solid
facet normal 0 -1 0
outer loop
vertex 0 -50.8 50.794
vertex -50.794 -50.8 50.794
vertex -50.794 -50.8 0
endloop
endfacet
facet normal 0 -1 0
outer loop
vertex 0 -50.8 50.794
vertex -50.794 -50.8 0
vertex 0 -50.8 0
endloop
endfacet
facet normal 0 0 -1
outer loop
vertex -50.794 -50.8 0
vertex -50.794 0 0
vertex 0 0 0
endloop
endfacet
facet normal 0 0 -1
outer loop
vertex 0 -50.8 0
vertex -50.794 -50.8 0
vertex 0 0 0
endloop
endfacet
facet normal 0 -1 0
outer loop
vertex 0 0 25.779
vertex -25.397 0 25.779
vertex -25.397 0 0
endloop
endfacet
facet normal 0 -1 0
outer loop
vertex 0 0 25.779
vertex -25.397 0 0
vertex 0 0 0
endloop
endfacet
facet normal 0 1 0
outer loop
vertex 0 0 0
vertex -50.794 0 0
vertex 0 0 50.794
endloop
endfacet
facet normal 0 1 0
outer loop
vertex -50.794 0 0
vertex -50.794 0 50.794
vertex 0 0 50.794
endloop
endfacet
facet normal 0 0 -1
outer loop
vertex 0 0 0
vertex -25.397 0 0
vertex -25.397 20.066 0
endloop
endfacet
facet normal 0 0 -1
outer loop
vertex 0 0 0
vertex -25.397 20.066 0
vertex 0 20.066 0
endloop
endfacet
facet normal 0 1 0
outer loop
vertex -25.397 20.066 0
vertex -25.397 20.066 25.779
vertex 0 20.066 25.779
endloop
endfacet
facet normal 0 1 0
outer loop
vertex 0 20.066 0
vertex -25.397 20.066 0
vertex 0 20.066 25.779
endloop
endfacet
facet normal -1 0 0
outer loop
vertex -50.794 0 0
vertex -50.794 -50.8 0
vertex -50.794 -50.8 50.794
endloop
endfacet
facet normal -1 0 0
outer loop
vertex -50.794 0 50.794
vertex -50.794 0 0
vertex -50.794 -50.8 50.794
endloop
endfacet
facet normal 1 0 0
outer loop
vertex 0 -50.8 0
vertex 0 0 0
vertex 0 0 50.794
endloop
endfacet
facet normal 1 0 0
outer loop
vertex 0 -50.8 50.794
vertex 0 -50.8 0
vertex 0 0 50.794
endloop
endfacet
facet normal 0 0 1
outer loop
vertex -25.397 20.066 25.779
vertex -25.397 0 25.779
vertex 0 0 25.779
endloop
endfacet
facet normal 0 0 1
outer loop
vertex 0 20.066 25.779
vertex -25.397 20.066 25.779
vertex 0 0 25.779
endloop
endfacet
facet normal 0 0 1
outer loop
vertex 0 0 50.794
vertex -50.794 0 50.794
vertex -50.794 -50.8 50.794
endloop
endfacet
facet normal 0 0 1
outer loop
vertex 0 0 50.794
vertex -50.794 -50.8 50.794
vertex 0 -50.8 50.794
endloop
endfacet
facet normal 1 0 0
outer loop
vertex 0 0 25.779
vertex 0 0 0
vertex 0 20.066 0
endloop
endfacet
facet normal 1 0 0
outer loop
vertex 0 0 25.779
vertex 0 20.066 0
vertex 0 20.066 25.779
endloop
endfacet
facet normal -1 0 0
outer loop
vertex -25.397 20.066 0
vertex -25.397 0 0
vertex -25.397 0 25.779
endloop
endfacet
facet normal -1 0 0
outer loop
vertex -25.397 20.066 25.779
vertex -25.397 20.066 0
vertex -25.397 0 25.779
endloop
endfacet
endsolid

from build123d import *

# Parameters (mm, degrees)
F0_W     = 50.7939383388
F0_H     = 50.7939346135
F1_DEPTH = 50.8
F2_W     = 25.3969691694
F2_H     = 25.3969673067
F3_DEPTH = 25.4
F6_W     = 25.3969673067
F6_H     = 25.7788784802
F7_DEPTH = 20.066


# Not quite as in the source:
# - the program builds the solid bodies; features that only make, move or delete a surface that nothing else refers to are left out


with BuildPart() as f1:
    # F0 (on Front) → F1 (new body)
    with BuildSketch(Plane.XZ):
        with Locations((-25.3969691694, 25.3969673067)):
            Rectangle(F0_W, F0_H)
    extrude(amount=F1_DEPTH)

    # F2 (on Front) → F3 (join)
    with BuildSketch(Plane.XZ):
        with Locations((-38.0954537541, 12.6984836534)):
            Rectangle(F2_W, F2_H)
    extrude(amount=F3_DEPTH)


with BuildPart() as f7:
    # F6 (on Front) → F7 (new body)
    with BuildSketch(Plane.XZ):
        with Locations((-12.6984836534, 12.8894392401)):
            Rectangle(F6_W, F6_H)
    extrude(amount=-F7_DEPTH)


solid = Compound([f1.part, f7.part])
